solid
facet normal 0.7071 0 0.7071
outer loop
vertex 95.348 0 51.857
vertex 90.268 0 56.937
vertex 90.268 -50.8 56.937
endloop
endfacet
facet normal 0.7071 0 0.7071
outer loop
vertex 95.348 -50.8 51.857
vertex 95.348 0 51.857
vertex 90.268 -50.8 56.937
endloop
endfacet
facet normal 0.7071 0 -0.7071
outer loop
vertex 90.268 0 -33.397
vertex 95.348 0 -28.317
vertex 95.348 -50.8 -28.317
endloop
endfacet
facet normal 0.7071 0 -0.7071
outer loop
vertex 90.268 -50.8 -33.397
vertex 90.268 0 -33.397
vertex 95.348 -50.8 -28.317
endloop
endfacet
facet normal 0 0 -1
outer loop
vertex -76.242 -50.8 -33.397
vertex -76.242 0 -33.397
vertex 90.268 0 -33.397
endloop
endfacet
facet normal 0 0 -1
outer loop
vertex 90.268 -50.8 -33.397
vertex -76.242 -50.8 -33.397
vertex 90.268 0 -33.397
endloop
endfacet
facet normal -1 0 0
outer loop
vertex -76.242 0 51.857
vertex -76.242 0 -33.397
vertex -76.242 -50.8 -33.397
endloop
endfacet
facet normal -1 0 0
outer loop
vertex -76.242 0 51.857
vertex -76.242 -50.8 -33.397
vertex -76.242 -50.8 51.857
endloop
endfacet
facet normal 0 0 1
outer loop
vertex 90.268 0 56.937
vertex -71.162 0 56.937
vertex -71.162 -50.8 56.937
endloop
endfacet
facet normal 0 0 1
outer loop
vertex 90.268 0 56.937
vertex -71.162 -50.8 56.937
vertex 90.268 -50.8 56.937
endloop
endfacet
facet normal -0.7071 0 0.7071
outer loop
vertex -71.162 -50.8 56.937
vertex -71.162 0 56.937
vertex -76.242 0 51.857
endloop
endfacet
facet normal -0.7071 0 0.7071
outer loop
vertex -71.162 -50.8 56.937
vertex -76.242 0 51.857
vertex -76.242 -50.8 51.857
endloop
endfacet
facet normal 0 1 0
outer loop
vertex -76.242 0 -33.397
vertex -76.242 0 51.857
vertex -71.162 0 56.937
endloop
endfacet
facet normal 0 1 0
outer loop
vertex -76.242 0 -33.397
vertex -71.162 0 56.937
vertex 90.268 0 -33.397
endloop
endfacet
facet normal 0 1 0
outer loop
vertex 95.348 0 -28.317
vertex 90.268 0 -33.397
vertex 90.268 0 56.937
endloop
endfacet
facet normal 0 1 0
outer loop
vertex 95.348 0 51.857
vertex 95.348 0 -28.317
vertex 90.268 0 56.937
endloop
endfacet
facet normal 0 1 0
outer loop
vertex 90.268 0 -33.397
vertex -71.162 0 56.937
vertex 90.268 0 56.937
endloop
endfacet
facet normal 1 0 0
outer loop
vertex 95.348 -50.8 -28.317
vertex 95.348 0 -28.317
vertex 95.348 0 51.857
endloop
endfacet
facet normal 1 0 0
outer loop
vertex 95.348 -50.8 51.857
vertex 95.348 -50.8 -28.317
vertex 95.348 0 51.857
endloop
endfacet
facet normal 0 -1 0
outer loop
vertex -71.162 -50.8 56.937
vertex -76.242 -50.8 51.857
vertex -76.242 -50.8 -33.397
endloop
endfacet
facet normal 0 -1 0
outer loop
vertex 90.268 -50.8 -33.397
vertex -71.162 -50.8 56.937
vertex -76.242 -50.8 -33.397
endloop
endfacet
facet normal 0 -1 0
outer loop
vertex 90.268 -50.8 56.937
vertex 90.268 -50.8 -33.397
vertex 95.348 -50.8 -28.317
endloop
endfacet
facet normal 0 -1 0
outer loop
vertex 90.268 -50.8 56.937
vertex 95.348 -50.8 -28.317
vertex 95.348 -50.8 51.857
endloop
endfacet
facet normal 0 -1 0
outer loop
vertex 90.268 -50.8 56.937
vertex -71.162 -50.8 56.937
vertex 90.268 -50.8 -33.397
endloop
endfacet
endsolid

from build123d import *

# Parameters (mm, degrees)
F0_W     = 171.5900823474
F0_H     = 90.3337560594
F1_DEPTH = 50.8
F3_SIZE  = 5.08


# Not quite as in the source:
# - a feature names something its author has since deleted; it is built from what else it names


with BuildPart() as f1:
    # F0 (on Front) → F1 (new body)
    with BuildSketch(Plane.XZ):
        with Locations((9.5528103411, 11.7697473615)):
            Rectangle(F0_W, F0_H)
    extrude(amount=F1_DEPTH)

    # F3
    f3_edges = [f1.edges().sort_by_distance(p)[0] for p in [
        (-76.242231, -25.4, 56.936625),
        (95.347852, -25.4, 56.936625),
        (95.347852, -25.4, -33.397131),
    ]]
    chamfer(f3_edges, length=F3_SIZE)


solid = f1.part
